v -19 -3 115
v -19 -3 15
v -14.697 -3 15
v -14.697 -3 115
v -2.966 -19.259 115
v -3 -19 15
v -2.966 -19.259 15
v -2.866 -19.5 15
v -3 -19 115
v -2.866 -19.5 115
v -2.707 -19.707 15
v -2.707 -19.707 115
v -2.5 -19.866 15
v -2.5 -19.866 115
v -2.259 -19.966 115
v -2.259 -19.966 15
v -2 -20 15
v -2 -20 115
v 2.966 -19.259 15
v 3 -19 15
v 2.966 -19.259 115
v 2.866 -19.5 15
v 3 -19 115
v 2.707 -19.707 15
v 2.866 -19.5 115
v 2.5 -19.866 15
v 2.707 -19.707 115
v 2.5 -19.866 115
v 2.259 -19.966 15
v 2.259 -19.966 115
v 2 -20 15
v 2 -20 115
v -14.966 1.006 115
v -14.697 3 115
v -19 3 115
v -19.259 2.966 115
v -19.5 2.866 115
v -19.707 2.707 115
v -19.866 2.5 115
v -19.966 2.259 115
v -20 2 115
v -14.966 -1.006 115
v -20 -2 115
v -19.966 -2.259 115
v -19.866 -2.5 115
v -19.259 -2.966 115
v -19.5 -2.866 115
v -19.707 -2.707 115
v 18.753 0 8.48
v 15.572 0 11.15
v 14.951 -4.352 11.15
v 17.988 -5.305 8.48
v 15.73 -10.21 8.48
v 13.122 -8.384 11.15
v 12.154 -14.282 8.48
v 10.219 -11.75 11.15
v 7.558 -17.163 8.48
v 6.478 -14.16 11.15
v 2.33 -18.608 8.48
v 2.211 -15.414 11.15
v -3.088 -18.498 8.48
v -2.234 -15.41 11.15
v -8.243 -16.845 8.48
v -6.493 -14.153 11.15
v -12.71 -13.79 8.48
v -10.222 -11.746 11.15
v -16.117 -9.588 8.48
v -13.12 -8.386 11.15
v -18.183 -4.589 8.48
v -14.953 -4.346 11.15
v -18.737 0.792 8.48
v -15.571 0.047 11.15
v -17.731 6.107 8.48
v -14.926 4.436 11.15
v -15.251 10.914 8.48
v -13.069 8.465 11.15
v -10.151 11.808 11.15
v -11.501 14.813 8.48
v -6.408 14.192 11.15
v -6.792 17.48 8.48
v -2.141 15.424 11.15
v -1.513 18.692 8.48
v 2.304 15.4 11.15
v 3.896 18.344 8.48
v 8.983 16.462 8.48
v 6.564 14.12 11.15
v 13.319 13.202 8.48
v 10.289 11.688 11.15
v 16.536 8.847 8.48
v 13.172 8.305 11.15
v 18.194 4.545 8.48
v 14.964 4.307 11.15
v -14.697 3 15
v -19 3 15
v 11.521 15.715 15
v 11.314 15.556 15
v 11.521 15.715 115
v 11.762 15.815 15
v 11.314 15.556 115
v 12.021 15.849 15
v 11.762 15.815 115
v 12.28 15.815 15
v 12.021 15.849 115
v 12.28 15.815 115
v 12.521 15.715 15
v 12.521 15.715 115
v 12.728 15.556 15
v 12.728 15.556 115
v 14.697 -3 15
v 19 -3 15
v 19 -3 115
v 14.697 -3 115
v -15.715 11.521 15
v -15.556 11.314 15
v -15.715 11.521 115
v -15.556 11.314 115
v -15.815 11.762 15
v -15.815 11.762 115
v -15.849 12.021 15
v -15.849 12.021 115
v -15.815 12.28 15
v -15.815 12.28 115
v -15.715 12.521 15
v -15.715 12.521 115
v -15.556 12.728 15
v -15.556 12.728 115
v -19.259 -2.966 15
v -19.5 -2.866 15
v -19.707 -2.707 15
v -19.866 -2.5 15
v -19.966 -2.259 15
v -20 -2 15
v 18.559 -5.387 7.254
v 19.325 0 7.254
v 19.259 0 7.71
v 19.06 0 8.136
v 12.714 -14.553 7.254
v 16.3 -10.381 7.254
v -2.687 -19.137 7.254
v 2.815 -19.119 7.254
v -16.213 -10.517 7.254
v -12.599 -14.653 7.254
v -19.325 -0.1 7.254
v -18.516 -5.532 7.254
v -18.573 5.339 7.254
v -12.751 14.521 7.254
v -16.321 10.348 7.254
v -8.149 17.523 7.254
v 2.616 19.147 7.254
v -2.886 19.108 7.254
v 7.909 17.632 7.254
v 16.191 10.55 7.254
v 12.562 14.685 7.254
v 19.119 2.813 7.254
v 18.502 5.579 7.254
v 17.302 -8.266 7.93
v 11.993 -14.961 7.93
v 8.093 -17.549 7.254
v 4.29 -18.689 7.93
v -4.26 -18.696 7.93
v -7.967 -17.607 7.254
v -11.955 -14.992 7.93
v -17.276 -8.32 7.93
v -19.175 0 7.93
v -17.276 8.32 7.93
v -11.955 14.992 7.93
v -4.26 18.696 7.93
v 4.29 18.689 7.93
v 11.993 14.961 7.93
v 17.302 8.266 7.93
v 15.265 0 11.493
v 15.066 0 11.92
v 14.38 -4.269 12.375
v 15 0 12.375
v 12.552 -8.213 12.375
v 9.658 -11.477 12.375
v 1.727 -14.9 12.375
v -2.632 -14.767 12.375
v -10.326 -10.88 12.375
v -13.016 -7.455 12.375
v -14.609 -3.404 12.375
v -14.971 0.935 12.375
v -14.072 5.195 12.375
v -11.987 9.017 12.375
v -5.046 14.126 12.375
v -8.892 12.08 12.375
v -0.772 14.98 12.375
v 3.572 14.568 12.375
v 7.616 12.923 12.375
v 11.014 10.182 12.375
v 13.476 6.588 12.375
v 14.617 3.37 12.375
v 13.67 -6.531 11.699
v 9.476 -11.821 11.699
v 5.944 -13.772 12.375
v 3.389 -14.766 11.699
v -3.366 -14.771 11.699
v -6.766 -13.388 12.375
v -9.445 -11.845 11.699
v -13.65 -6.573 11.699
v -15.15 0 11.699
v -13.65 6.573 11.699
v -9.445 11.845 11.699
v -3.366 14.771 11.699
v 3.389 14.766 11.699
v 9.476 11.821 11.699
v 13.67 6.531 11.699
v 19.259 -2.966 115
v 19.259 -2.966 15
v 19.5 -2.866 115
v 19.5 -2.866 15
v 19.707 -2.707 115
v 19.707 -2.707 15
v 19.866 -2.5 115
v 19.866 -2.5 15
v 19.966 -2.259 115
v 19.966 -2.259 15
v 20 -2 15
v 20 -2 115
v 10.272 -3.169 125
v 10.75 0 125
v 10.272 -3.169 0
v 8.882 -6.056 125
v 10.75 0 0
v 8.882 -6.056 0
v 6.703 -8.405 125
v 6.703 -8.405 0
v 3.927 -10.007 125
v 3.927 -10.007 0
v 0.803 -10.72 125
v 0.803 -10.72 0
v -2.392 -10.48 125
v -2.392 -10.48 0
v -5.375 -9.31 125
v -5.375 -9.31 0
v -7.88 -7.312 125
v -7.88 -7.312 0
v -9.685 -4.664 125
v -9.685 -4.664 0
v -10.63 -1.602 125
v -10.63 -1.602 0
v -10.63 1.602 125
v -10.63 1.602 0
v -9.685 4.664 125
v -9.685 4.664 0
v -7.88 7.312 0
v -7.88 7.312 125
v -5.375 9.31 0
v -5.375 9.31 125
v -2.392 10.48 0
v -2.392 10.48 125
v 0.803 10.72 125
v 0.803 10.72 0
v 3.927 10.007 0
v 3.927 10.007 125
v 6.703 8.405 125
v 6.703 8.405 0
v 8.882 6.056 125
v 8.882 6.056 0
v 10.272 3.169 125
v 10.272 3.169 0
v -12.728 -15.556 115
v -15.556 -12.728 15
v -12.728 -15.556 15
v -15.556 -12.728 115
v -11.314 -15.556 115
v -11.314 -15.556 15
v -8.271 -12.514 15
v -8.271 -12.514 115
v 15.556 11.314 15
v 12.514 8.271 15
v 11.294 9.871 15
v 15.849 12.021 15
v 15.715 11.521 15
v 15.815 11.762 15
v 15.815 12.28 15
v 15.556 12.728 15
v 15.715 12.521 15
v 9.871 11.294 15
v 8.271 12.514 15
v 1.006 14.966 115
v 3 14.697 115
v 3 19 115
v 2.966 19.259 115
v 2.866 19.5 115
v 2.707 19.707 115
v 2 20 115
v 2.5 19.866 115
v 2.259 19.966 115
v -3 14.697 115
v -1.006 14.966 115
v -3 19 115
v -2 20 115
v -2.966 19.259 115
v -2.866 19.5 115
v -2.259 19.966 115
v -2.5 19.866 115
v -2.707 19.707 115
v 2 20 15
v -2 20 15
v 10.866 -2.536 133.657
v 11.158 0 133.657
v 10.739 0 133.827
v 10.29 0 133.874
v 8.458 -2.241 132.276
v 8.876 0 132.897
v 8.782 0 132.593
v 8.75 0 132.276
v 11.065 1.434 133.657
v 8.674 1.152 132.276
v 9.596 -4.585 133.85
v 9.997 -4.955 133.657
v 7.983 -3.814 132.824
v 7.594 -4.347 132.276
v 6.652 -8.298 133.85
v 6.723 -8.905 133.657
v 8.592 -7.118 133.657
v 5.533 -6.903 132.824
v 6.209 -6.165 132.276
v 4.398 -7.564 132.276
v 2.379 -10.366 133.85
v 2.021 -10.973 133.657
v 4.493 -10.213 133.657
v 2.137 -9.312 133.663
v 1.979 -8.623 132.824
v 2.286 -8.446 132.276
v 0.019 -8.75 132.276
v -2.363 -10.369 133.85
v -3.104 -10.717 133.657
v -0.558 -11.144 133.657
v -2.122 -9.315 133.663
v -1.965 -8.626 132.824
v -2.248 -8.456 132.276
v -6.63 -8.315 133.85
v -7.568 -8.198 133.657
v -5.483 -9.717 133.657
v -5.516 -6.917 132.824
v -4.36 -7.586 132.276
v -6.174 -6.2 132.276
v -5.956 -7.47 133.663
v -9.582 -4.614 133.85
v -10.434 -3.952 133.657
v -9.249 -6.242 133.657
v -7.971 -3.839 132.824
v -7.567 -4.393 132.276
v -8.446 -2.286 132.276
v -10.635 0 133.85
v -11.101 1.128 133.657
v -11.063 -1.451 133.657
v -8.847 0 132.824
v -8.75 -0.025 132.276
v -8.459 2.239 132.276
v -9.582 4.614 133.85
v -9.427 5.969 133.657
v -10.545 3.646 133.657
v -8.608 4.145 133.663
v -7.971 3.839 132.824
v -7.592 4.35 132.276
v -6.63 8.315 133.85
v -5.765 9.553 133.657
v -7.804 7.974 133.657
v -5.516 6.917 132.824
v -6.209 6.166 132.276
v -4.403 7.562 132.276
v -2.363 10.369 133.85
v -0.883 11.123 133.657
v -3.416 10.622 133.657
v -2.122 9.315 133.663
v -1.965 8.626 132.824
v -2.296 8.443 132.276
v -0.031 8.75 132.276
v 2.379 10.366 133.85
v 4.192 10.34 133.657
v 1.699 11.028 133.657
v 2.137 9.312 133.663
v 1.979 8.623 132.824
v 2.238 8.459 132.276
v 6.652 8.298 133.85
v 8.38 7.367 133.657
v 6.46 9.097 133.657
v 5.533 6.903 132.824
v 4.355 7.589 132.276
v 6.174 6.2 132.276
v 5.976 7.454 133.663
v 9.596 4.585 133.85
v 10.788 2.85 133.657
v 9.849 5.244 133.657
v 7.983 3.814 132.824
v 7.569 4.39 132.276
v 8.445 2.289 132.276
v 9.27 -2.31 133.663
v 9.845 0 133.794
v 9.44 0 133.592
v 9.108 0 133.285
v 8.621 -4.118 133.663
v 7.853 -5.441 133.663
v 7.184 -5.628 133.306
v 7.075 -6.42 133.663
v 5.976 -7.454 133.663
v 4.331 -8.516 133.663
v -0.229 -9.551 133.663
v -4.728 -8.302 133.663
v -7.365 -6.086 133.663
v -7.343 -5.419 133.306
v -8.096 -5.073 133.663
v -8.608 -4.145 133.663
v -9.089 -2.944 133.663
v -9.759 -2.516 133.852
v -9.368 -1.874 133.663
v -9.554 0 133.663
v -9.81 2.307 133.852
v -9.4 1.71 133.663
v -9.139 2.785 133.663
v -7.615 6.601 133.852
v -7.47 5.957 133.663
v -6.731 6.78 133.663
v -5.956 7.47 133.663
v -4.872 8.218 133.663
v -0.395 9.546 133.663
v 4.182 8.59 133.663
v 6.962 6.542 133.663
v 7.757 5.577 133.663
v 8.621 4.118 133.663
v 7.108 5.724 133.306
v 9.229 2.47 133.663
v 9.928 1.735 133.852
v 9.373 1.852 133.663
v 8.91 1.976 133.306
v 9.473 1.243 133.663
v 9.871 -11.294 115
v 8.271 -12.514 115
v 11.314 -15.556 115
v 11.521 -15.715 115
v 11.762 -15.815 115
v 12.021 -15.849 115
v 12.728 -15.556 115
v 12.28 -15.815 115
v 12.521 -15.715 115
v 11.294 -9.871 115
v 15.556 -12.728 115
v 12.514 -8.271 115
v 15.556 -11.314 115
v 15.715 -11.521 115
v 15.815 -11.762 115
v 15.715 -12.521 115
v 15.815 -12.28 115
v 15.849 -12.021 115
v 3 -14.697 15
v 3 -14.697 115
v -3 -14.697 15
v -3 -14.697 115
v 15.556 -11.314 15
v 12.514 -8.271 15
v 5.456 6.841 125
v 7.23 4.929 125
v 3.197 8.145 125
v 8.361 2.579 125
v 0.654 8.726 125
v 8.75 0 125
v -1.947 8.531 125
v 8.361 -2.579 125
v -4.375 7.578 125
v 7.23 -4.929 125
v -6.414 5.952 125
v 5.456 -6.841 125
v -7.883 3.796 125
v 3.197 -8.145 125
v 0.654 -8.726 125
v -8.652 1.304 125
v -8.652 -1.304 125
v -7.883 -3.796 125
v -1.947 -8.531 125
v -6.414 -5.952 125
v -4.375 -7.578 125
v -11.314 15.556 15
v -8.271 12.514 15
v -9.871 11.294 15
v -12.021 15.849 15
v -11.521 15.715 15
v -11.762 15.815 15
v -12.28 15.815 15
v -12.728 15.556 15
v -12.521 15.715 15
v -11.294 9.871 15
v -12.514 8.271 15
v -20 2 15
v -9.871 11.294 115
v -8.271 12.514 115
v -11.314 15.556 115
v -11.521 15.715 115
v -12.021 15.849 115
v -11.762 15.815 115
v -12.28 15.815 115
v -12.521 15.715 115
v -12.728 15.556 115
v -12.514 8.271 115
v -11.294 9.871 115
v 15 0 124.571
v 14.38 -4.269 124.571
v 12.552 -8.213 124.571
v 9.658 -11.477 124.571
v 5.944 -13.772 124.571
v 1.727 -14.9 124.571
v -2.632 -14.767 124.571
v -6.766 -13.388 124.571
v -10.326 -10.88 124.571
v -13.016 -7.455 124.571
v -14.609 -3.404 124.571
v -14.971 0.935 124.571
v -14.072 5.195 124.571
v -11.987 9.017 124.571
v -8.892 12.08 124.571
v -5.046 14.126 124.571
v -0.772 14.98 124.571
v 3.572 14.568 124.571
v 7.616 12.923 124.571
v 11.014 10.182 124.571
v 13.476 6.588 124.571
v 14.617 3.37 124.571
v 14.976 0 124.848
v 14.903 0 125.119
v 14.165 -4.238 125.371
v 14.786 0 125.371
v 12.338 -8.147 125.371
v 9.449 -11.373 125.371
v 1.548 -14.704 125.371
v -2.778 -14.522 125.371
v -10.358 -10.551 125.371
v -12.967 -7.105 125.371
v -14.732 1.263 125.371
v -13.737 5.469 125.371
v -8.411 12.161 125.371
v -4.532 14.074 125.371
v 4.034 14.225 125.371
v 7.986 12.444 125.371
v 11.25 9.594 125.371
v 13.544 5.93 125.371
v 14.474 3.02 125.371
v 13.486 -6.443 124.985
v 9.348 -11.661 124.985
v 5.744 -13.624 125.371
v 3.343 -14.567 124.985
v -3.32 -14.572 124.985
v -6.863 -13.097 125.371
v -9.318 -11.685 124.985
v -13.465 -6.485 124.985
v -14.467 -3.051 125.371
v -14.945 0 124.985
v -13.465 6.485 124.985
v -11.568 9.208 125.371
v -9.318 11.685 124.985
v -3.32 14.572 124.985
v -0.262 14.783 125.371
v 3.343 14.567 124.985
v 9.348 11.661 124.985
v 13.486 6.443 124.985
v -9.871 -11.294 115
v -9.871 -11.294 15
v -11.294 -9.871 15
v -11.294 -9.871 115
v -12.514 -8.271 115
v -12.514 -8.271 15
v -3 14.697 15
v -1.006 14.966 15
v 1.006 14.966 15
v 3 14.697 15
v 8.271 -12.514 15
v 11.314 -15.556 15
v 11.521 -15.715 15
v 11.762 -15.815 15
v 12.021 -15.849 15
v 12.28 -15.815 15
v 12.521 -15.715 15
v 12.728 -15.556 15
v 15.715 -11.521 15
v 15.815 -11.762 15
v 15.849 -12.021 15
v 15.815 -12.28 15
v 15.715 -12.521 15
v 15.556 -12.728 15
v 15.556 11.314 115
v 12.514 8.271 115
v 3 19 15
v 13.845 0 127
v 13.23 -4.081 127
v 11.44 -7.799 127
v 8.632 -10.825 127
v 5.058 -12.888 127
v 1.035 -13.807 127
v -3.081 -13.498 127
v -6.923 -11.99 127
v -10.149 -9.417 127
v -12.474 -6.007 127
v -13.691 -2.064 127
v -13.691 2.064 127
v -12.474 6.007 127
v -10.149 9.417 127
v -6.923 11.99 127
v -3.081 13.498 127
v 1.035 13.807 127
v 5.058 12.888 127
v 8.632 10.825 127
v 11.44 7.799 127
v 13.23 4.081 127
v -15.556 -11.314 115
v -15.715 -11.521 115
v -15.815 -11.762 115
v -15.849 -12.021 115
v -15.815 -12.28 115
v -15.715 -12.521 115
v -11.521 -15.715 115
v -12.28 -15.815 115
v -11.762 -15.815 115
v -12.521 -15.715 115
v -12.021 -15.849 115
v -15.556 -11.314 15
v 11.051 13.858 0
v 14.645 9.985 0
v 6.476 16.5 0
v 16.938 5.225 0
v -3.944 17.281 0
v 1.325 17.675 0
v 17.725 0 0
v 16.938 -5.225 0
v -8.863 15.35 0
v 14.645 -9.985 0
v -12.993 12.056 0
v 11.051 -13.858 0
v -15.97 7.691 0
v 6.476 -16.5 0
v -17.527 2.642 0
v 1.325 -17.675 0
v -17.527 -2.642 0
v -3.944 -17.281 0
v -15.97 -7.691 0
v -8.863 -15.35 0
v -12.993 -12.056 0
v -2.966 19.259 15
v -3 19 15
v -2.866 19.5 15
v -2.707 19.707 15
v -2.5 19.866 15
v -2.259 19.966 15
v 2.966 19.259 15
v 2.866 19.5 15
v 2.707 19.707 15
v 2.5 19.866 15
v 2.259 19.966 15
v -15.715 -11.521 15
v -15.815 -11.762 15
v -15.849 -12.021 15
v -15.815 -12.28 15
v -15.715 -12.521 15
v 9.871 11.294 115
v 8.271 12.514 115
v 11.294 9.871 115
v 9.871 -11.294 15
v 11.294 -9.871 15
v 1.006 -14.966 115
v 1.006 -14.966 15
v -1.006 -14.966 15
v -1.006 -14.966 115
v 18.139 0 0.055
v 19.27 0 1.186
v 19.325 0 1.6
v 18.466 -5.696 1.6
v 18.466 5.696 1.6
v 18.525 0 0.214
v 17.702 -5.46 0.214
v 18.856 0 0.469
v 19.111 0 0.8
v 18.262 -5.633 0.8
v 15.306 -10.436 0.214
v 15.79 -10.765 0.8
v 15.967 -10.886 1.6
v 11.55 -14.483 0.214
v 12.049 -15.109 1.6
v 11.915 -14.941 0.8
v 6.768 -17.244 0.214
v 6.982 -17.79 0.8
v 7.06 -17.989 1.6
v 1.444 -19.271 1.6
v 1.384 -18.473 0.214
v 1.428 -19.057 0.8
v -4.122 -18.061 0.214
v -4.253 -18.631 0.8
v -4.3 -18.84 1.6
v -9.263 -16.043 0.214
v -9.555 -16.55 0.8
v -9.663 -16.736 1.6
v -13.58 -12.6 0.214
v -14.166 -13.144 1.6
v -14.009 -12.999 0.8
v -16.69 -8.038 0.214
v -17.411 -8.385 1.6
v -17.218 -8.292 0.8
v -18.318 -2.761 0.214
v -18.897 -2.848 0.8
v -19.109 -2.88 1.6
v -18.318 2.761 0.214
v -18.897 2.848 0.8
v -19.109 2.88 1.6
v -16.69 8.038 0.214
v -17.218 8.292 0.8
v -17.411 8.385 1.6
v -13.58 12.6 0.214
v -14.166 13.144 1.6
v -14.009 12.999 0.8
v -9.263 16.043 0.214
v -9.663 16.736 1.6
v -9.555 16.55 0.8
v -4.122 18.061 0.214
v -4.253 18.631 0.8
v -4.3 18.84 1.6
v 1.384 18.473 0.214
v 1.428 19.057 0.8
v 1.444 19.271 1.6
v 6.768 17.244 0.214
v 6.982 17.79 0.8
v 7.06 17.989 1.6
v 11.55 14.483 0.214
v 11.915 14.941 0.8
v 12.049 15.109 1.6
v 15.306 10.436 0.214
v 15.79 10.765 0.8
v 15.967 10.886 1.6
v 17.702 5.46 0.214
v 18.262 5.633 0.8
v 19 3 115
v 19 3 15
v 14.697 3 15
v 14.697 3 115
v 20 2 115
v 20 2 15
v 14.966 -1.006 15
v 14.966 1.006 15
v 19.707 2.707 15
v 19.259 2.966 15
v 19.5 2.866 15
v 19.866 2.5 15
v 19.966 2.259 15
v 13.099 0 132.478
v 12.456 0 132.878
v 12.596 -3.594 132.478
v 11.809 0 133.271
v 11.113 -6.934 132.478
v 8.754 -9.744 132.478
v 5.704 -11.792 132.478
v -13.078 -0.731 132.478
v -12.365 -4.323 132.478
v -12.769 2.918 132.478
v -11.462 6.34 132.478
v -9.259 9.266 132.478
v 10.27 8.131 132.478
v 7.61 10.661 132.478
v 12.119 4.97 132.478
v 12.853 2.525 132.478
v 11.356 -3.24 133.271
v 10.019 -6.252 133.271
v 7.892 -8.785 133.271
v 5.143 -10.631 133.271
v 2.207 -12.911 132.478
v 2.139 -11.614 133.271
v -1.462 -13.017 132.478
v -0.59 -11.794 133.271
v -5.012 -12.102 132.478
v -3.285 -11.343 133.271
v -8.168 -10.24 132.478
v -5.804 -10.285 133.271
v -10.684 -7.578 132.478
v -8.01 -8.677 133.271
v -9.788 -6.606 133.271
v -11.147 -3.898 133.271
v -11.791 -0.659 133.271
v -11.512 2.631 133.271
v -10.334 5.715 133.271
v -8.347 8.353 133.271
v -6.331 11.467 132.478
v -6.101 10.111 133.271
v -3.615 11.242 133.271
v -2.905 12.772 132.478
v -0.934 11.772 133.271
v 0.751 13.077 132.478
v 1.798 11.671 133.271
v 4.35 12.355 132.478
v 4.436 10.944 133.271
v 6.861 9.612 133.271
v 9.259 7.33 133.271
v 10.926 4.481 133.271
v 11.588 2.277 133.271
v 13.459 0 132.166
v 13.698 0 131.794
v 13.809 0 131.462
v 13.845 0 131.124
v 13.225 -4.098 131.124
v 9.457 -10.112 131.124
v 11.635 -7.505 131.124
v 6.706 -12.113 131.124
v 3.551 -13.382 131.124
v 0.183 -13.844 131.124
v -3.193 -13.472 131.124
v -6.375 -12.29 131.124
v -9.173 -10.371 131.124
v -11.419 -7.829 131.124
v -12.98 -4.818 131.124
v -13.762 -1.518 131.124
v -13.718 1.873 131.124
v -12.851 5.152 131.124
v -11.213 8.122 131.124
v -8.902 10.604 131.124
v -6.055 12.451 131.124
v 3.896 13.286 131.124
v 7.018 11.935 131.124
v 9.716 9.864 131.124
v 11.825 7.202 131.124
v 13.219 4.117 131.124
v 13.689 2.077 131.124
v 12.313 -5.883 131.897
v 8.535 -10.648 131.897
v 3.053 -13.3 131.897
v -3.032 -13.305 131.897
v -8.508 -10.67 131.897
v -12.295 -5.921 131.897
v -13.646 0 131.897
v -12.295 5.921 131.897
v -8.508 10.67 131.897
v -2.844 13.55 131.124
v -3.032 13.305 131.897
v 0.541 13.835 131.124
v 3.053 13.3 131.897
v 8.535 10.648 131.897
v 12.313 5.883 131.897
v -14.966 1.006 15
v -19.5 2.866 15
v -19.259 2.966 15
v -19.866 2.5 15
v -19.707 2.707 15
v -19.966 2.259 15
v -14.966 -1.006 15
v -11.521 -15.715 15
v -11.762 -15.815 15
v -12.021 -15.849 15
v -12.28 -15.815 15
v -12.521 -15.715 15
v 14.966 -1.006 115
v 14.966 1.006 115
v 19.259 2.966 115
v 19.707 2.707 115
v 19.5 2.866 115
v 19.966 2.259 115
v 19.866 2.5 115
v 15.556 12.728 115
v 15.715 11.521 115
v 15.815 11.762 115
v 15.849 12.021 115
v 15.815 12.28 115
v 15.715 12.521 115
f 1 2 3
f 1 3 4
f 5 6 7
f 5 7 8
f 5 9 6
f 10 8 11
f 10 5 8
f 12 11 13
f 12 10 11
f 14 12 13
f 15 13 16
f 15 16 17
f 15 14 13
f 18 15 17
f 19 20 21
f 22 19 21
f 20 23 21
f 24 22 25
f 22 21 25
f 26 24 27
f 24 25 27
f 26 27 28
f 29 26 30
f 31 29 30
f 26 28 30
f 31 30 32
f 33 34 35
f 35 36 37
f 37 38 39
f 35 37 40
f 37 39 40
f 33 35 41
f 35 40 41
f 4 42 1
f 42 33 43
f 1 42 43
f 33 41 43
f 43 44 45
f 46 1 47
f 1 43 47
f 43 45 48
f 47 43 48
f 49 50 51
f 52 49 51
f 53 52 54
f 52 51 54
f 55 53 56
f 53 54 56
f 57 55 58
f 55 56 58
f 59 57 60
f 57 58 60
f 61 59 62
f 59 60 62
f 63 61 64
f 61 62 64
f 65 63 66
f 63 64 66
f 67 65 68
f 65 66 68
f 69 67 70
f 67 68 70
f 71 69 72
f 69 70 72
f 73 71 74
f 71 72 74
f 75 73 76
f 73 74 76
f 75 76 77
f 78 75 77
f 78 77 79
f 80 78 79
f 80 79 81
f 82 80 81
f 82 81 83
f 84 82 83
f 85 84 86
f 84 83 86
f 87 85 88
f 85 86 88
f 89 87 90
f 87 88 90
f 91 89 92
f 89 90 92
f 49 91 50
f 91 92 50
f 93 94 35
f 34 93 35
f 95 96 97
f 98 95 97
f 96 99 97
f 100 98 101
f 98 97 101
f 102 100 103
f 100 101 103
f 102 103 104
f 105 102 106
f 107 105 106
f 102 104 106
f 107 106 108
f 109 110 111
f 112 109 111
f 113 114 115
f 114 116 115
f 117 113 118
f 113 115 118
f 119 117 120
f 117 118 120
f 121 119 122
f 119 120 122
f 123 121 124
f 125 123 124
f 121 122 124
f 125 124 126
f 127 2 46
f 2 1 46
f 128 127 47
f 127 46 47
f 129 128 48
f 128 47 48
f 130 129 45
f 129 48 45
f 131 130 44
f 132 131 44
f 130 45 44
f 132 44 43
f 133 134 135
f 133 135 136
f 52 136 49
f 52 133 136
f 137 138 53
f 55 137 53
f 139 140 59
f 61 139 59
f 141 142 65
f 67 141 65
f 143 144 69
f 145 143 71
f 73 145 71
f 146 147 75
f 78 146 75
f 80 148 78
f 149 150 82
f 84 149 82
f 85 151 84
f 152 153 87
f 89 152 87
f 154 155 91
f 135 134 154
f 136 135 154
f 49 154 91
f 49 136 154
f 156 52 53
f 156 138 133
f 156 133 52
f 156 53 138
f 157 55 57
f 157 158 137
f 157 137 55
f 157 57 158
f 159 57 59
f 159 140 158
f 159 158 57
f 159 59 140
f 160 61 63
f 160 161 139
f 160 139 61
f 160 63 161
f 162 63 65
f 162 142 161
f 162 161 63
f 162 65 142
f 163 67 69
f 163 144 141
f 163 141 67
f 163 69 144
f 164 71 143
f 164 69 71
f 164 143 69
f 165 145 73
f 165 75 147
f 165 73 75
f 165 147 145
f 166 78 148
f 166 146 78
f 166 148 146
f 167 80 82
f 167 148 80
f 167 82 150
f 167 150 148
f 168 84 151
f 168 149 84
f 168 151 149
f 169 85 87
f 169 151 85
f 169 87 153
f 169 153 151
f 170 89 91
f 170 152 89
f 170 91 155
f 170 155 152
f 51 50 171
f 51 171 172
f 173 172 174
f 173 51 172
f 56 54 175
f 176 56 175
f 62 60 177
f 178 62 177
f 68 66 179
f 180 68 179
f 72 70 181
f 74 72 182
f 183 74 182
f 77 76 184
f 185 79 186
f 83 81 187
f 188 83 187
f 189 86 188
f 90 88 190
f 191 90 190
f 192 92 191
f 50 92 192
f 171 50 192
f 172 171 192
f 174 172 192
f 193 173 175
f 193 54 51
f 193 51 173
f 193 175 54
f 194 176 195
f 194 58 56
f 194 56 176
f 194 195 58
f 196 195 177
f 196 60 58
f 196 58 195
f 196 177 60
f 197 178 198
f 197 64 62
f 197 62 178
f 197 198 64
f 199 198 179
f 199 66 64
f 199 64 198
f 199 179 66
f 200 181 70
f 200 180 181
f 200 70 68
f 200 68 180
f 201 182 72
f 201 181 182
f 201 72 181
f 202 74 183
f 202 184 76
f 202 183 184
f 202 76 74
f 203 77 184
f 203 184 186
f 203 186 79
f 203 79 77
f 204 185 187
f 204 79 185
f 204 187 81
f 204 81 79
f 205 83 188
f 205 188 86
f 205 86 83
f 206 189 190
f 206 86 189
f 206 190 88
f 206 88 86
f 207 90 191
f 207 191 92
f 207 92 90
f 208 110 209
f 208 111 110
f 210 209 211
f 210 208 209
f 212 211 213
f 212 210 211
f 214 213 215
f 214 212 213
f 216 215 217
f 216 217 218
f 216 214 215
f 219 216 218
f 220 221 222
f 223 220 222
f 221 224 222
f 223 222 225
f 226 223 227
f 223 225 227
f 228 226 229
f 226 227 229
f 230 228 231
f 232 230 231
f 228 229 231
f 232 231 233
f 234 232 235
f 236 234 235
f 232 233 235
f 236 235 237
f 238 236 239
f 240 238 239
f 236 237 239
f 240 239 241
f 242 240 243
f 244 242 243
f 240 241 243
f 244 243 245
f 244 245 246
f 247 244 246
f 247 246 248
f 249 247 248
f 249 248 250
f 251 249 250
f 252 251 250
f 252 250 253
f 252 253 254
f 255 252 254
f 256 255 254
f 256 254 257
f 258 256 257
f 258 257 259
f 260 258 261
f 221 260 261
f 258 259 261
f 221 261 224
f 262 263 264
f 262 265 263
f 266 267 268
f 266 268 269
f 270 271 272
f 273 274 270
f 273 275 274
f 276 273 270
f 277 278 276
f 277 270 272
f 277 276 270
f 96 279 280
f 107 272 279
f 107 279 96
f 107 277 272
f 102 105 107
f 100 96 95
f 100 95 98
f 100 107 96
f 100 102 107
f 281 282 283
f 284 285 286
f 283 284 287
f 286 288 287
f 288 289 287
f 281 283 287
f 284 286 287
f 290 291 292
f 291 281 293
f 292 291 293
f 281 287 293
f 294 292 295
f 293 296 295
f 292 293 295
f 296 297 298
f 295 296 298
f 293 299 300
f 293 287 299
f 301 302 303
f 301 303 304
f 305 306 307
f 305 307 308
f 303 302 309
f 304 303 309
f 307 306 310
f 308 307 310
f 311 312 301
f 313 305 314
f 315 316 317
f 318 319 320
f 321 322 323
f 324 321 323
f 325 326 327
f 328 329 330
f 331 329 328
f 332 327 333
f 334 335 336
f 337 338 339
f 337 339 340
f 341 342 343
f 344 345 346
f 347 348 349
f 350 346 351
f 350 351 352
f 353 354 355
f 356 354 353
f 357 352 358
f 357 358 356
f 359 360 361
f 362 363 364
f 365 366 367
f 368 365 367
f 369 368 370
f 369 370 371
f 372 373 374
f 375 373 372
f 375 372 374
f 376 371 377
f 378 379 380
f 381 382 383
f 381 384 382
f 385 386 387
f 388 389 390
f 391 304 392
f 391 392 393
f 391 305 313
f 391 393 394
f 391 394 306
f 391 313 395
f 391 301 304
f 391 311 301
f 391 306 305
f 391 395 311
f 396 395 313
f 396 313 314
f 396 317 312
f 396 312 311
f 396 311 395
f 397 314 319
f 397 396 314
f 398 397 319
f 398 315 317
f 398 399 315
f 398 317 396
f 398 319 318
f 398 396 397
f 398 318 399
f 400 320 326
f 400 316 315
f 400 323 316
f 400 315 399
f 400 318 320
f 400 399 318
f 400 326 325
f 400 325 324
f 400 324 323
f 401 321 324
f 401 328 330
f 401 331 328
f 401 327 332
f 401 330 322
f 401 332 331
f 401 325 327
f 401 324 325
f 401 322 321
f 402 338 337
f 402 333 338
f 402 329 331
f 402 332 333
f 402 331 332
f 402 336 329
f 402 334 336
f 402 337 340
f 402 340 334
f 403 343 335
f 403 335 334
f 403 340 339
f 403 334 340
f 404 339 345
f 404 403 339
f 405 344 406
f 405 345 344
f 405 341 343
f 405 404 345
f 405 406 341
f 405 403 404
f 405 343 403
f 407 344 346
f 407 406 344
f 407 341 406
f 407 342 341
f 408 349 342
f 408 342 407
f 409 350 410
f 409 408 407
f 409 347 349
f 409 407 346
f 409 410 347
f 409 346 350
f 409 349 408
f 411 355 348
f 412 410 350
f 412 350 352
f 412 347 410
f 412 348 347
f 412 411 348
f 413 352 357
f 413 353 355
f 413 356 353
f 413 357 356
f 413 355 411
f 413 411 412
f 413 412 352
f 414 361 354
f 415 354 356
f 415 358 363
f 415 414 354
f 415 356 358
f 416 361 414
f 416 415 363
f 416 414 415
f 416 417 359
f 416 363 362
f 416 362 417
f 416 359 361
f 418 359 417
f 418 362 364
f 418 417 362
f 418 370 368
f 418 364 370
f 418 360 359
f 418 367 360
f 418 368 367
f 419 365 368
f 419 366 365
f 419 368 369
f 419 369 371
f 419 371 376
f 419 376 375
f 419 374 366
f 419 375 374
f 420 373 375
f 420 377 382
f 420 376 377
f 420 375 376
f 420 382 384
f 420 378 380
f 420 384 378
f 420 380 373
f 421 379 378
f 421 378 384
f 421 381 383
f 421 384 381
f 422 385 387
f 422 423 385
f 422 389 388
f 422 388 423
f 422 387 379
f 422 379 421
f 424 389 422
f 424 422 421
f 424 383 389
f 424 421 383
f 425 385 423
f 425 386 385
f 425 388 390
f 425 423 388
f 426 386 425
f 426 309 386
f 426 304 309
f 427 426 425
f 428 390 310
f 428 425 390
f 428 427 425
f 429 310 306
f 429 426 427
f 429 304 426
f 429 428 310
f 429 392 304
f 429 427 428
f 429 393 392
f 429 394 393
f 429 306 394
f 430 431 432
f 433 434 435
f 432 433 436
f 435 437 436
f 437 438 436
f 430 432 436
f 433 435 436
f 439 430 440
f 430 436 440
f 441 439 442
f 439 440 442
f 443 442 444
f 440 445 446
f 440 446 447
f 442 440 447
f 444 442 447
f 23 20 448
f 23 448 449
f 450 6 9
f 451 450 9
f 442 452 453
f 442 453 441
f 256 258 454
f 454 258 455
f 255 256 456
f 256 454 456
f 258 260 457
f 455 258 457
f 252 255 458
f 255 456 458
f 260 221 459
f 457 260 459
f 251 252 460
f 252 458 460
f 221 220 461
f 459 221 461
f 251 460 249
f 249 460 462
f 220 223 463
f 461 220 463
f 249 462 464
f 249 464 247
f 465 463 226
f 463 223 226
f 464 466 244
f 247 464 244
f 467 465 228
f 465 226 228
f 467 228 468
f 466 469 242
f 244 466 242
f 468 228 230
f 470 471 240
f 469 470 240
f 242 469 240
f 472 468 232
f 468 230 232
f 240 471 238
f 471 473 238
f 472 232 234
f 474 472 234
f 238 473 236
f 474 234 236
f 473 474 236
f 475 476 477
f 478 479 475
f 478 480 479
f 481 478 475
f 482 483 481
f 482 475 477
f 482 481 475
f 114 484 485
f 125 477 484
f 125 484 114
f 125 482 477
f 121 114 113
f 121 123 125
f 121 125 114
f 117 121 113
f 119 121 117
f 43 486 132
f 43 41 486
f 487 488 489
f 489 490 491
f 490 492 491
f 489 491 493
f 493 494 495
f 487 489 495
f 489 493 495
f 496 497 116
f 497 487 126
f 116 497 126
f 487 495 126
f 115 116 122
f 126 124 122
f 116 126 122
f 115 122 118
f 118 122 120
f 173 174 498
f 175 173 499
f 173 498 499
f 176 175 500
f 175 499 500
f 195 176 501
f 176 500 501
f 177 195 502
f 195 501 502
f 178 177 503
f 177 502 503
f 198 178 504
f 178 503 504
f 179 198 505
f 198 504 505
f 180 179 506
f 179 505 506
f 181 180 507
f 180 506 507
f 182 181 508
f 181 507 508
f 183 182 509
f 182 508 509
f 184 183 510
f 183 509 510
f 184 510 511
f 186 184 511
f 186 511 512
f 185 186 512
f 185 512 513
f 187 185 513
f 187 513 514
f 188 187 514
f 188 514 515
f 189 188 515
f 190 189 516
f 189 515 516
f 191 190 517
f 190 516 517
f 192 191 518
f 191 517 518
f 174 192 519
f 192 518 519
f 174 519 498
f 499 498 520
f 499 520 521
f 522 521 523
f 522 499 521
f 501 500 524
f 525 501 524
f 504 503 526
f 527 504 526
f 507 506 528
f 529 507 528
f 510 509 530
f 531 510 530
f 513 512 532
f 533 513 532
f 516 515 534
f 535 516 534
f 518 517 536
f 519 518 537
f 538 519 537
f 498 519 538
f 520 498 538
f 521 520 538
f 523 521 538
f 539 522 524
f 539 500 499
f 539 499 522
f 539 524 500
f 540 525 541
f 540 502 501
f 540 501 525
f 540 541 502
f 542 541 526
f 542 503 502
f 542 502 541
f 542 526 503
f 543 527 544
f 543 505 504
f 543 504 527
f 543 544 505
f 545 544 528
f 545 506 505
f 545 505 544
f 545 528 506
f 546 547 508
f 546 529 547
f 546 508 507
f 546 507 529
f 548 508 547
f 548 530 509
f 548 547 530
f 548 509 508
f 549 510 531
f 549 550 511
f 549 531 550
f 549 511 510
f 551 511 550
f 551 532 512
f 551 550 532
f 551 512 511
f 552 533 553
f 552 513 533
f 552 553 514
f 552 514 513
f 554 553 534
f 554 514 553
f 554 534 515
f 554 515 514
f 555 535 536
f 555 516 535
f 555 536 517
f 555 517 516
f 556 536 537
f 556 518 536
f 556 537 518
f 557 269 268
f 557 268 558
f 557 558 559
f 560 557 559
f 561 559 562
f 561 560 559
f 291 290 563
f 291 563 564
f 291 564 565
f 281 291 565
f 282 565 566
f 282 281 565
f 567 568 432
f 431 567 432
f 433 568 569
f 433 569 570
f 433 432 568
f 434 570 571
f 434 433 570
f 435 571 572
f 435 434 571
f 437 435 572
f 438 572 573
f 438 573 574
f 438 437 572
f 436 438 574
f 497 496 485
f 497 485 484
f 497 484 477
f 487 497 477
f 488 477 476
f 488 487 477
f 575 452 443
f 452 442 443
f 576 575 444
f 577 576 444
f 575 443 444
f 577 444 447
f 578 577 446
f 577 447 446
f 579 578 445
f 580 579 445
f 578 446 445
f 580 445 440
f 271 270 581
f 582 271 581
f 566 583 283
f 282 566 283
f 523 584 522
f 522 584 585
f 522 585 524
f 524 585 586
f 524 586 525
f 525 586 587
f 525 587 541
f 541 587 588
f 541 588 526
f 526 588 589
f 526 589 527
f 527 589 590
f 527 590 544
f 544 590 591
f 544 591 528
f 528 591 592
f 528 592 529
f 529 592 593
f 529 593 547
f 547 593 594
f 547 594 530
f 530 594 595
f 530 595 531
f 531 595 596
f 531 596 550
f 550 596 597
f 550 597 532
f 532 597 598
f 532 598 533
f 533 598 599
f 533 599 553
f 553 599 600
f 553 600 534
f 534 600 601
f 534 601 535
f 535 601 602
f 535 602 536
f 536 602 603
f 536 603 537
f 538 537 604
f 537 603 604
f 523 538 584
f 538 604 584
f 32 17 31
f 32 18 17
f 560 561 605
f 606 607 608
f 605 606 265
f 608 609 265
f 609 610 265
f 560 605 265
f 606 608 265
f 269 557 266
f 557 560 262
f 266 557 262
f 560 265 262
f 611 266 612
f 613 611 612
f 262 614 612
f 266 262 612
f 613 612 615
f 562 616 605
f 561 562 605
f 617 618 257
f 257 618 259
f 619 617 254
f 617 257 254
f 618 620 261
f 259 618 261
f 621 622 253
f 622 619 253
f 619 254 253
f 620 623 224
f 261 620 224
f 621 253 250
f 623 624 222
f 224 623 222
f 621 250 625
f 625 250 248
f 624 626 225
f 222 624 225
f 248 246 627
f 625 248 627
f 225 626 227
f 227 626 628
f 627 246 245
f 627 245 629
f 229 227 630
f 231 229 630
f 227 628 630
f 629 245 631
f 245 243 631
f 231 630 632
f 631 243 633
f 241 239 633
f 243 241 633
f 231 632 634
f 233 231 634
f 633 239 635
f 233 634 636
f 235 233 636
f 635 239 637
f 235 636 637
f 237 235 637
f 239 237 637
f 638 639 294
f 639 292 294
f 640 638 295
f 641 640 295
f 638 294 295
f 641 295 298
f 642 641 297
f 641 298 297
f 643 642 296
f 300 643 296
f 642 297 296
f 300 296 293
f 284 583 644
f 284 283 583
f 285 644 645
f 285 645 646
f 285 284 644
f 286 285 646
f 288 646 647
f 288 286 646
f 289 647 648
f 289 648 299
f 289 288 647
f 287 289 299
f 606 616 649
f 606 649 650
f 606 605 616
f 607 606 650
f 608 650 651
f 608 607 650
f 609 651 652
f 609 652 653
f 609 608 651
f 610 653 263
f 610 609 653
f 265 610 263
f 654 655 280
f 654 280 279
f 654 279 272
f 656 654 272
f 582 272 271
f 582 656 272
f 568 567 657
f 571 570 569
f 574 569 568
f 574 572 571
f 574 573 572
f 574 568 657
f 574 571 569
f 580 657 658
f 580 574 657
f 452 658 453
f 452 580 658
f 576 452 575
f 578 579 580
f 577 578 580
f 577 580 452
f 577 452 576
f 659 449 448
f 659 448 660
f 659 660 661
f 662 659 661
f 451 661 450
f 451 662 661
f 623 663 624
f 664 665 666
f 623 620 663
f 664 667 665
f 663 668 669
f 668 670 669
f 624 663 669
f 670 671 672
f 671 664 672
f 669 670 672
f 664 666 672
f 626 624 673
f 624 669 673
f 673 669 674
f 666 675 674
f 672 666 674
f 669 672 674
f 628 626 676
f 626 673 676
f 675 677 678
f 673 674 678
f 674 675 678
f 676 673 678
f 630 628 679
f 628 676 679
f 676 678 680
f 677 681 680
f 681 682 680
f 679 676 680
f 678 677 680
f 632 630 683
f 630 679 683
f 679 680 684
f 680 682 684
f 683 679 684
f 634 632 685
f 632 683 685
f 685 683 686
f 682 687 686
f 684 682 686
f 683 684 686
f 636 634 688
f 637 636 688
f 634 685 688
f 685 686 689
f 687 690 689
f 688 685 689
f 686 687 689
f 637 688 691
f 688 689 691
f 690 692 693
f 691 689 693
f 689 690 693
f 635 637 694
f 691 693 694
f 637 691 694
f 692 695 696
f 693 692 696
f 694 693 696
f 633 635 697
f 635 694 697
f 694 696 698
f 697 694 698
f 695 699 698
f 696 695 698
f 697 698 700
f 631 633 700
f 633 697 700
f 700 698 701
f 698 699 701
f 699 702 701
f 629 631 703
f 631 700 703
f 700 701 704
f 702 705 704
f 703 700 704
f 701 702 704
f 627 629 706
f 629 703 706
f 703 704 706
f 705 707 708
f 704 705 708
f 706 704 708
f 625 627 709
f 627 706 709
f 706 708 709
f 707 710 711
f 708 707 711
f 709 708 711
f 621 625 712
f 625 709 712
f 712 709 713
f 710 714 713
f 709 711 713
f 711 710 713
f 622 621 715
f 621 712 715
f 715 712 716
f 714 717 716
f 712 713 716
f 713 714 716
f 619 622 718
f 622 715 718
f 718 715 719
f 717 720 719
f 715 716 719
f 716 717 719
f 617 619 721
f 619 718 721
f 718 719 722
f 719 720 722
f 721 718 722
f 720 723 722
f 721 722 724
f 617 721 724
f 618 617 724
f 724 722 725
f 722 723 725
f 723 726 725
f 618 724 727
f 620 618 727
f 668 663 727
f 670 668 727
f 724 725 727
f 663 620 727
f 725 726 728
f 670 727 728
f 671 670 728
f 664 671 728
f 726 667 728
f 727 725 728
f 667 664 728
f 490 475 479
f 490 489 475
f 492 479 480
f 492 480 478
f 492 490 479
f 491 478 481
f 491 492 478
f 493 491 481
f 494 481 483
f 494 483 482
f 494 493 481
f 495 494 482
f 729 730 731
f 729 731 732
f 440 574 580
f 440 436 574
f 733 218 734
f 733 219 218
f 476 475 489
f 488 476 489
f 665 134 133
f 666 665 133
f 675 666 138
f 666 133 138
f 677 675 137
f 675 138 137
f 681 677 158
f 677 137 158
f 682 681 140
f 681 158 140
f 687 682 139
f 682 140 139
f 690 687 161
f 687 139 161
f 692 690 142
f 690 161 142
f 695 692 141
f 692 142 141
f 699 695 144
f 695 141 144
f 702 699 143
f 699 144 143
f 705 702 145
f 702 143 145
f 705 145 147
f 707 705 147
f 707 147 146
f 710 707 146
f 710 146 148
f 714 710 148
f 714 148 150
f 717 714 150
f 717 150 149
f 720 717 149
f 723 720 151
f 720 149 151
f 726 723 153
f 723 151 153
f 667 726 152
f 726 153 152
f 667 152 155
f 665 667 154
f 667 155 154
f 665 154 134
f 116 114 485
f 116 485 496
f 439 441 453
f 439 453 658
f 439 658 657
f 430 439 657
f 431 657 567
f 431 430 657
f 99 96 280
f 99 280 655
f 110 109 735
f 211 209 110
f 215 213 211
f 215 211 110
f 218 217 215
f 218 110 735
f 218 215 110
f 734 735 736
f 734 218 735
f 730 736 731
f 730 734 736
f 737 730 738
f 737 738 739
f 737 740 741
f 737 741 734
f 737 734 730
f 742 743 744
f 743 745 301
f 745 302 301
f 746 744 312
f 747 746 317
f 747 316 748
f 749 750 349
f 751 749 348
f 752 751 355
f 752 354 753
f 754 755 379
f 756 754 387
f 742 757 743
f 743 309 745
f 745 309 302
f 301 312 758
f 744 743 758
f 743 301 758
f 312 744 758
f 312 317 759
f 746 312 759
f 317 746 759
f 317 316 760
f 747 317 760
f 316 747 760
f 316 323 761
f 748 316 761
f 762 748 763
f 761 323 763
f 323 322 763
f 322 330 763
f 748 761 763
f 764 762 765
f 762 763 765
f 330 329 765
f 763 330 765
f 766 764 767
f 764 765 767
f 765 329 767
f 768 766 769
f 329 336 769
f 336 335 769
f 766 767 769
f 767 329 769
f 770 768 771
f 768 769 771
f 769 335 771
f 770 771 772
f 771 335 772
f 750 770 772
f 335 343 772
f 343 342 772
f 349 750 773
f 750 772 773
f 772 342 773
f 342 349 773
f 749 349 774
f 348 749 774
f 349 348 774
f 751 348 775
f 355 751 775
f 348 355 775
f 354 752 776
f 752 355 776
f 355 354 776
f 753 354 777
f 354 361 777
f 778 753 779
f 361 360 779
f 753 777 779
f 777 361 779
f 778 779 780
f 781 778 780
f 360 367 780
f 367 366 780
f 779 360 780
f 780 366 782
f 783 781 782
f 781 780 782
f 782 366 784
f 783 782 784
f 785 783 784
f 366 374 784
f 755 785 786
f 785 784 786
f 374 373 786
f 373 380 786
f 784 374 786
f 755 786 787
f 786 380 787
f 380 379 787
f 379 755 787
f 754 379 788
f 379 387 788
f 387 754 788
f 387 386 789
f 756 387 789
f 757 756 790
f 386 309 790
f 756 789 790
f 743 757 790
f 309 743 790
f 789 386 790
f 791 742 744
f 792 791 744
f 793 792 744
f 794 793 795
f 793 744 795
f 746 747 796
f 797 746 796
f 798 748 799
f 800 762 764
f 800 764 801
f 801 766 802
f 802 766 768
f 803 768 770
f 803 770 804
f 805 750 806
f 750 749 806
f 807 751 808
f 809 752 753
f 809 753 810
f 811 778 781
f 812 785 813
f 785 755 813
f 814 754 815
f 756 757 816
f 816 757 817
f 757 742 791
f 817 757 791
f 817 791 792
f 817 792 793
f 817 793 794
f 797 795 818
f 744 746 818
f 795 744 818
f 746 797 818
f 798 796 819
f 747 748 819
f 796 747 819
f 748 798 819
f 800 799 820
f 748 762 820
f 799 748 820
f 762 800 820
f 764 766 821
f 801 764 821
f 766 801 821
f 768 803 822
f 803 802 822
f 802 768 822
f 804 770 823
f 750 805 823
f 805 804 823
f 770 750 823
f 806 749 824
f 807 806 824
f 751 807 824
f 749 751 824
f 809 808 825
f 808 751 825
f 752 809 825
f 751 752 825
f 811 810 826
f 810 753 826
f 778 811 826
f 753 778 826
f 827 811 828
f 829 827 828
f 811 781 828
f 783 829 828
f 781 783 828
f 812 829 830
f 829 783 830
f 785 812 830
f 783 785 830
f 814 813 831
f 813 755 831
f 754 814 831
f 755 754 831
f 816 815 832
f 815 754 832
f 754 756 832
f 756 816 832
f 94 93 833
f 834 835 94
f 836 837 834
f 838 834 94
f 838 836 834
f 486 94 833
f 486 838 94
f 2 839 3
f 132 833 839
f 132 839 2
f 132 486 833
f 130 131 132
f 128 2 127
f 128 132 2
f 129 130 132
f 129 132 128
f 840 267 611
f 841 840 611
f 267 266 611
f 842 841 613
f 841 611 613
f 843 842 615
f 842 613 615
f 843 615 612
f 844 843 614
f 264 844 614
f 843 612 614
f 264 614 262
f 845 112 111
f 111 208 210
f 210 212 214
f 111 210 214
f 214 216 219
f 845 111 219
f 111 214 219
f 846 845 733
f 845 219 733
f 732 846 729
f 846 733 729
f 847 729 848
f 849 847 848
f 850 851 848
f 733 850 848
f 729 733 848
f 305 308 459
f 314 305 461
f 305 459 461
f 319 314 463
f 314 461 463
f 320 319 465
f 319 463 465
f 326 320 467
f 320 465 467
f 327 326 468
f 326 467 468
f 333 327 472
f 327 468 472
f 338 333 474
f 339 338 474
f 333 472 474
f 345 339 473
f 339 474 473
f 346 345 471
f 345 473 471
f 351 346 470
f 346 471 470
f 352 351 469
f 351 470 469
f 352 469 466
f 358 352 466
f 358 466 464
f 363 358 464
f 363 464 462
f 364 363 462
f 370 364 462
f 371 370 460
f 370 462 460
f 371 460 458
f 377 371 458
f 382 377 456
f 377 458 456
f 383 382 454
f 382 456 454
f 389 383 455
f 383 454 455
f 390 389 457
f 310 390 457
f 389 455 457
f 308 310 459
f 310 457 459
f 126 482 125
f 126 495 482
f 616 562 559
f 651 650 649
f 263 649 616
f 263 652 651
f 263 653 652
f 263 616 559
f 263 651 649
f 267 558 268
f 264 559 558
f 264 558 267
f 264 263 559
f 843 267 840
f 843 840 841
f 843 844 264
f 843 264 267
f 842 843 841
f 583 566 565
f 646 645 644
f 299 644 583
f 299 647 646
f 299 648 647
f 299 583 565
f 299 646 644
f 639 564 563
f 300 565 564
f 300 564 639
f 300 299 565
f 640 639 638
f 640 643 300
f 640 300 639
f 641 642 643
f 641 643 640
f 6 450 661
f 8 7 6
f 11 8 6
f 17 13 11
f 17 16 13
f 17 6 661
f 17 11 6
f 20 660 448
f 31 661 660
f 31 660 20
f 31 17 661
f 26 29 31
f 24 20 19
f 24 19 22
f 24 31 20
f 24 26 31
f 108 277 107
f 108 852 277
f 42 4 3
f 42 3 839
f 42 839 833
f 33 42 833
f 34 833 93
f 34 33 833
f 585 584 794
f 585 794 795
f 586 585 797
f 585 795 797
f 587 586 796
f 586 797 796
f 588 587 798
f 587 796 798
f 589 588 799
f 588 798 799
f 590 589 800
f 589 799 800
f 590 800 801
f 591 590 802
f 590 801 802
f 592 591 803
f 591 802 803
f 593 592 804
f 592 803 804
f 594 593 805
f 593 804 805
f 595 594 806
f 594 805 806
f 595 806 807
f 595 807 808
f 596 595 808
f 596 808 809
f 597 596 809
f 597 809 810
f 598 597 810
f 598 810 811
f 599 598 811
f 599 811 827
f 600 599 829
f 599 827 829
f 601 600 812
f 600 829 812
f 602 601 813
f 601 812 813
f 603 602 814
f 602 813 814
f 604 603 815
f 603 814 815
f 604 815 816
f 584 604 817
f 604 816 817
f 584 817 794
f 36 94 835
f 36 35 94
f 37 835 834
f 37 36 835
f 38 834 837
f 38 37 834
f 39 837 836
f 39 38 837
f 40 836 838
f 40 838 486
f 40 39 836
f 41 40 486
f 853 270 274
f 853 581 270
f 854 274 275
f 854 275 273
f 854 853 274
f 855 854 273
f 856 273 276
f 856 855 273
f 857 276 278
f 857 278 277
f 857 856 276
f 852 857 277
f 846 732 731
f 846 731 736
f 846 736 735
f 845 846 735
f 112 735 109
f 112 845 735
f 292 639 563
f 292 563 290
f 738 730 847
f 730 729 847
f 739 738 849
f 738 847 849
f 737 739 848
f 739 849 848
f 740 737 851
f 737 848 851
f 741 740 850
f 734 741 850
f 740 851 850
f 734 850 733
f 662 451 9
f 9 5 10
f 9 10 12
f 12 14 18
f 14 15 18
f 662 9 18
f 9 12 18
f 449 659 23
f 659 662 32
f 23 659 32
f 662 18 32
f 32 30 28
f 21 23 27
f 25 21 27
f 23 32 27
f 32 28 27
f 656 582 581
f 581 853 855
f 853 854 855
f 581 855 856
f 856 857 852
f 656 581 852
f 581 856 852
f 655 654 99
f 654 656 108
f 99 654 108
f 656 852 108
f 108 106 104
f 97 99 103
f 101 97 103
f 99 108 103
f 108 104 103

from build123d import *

# Parameters (mm, degrees)
F2_R            = 1.6
F4_W            = 6
F4_H            = 100
F5_COPIES_COUNT = 8
F6_R            = 1
F6_2_R          = 1
F6_3_R          = 1
F6_4_R          = 1
F6_5_R          = 1
F6_6_R          = 1
F6_7_R          = 1
F6_8_R          = 1


# Not quite as in the source:
# - a feature of the source that left no trace in its solid (it failed there, or was rolled back) is left out
# - a pattern or mirror of a feature is missing from the dataset's text; its kind, count and spacing are read off the source's solid


with BuildPart() as f1:
    # F0 (on Front) → F1 (revolve)
    with BuildSketch(Plane.XZ):
        with BuildLine():
            ThreePointArc((13.8452994616, 132), (11.3302729145, 133.5554082968), (8.75, 135))
            Line((8.75, 135), (8.75, 125))
            Line((8.75, 125), (10.75, 125))
            Line((10.75, 125), (10.75, 0))
            Line((10.75, 0), (19.325, 0))
            Line((19.325, 0), (19.325, 8))
            Line((19.325, 8), (15, 11.6291059048))
            Line((15, 11.6291059048), (15, 125))
            Line((15, 125), (13.8452994616, 127))
            Line((13.8452994616, 127), (13.8452994616, 132))
        make_face()
    revolve(axis=Axis((0, 0, 15.7782279773), (0, 0, -1)))

    # F2
    f2_edges = [f1.edges().sort_by_distance(p)[0] for p in [
        (-8.75, 0, 135),
        (-13.845299, 0, 132),
        (-15, 0, 125),
        (-15, 0, 11.629106),
        (-19.325, 0, 8),
        (-19.325, 0, 0),
    ]]
    fillet(f2_edges, radius=F2_R)


with BuildPart() as f5:
    # F4 (on offset) → F5 (new body, up to the next surface of F1)
    with BuildSketch(Plane.YZ.offset(20)):
        with Locations((0, 65)):
            Rectangle(F4_W, F4_H)
    extrude(until=Until.NEXT, target=f1.part, dir=(-1, 0, 0))


with BuildPart() as f5_copies_1:
    # F5_copies: instance of F5
    add(f5.part.rotate(Axis((0, 0, 0), (0, 0, 1)), 1 * 360 / F5_COPIES_COUNT))

    # F6#2
    f6_2_edges = [f5_copies_1.edges().sort_by_distance(p)[0] for p in [
        (16.263456, 12.020815, 65),
        (12.020815, 16.263456, 65),
    ]]
    fillet(f6_2_edges, radius=F6_2_R)


with BuildPart() as f5_copies_2:
    # F5_copies: instance of F5
    add(f5.part.rotate(Axis((0, 0, 0), (0, 0, 1)), 2 * 360 / F5_COPIES_COUNT))

    # F6#3
    f6_3_edges = [f5_copies_2.edges().sort_by_distance(p)[0] for p in [
        (3, 20, 65),
        (-3, 20, 65),
    ]]
    fillet(f6_3_edges, radius=F6_3_R)


with BuildPart() as f5_copies_3:
    # F5_copies: instance of F5
    add(f5.part.rotate(Axis((0, 0, 0), (0, 0, 1)), 3 * 360 / F5_COPIES_COUNT))

    # F6#4
    f6_4_edges = [f5_copies_3.edges().sort_by_distance(p)[0] for p in [
        (-12.020815, 16.263456, 65),
        (-16.263456, 12.020815, 65),
    ]]
    fillet(f6_4_edges, radius=F6_4_R)


with BuildPart() as f5_copies_4:
    # F5_copies: instance of F5
    add(f5.part.rotate(Axis((0, 0, 0), (0, 0, 1)), 4 * 360 / F5_COPIES_COUNT))

    # F6#5
    f6_5_edges = [f5_copies_4.edges().sort_by_distance(p)[0] for p in [
        (-20, 3, 65),
        (-20, -3, 65),
    ]]
    fillet(f6_5_edges, radius=F6_5_R)


with BuildPart() as f5_copies_5:
    # F5_copies: instance of F5
    add(f5.part.rotate(Axis((0, 0, 0), (0, 0, 1)), 5 * 360 / F5_COPIES_COUNT))

    # F6#6
    f6_6_edges = [f5_copies_5.edges().sort_by_distance(p)[0] for p in [
        (-16.263456, -12.020815, 65),
        (-12.020815, -16.263456, 65),
    ]]
    fillet(f6_6_edges, radius=F6_6_R)


with BuildPart() as f5_copies_6:
    # F5_copies: instance of F5
    add(f5.part.rotate(Axis((0, 0, 0), (0, 0, 1)), 6 * 360 / F5_COPIES_COUNT))

    # F6#7
    f6_7_edges = [f5_copies_6.edges().sort_by_distance(p)[0] for p in [
        (-3, -20, 65),
        (3, -20, 65),
    ]]
    fillet(f6_7_edges, radius=F6_7_R)


with BuildPart() as f5_copies_7:
    # F5_copies: instance of F5
    add(f5.part.rotate(Axis((0, 0, 0), (0, 0, 1)), 7 * 360 / F5_COPIES_COUNT))

    # F6#8
    f6_8_edges = [f5_copies_7.edges().sort_by_distance(p)[0] for p in [
        (12.020815, -16.263456, 65),
        (16.263456, -12.020815, 65),
    ]]
    fillet(f6_8_edges, radius=F6_8_R)


with BuildPart() as f5_1:
    add(f5.part)

    # F6
    f6_edges = [f5_1.edges().sort_by_distance(p)[0] for p in [
        (20, -3, 65),
        (20, 3, 65),
    ]]
    fillet(f6_edges, radius=F6_R)


solid = Compound([f1.part, f5_copies_1.part, f5_copies_2.part, f5_copies_3.part, f5_copies_4.part, f5_copies_5.part, f5_copies_6.part, f5_copies_7.part, f5_1.part])
